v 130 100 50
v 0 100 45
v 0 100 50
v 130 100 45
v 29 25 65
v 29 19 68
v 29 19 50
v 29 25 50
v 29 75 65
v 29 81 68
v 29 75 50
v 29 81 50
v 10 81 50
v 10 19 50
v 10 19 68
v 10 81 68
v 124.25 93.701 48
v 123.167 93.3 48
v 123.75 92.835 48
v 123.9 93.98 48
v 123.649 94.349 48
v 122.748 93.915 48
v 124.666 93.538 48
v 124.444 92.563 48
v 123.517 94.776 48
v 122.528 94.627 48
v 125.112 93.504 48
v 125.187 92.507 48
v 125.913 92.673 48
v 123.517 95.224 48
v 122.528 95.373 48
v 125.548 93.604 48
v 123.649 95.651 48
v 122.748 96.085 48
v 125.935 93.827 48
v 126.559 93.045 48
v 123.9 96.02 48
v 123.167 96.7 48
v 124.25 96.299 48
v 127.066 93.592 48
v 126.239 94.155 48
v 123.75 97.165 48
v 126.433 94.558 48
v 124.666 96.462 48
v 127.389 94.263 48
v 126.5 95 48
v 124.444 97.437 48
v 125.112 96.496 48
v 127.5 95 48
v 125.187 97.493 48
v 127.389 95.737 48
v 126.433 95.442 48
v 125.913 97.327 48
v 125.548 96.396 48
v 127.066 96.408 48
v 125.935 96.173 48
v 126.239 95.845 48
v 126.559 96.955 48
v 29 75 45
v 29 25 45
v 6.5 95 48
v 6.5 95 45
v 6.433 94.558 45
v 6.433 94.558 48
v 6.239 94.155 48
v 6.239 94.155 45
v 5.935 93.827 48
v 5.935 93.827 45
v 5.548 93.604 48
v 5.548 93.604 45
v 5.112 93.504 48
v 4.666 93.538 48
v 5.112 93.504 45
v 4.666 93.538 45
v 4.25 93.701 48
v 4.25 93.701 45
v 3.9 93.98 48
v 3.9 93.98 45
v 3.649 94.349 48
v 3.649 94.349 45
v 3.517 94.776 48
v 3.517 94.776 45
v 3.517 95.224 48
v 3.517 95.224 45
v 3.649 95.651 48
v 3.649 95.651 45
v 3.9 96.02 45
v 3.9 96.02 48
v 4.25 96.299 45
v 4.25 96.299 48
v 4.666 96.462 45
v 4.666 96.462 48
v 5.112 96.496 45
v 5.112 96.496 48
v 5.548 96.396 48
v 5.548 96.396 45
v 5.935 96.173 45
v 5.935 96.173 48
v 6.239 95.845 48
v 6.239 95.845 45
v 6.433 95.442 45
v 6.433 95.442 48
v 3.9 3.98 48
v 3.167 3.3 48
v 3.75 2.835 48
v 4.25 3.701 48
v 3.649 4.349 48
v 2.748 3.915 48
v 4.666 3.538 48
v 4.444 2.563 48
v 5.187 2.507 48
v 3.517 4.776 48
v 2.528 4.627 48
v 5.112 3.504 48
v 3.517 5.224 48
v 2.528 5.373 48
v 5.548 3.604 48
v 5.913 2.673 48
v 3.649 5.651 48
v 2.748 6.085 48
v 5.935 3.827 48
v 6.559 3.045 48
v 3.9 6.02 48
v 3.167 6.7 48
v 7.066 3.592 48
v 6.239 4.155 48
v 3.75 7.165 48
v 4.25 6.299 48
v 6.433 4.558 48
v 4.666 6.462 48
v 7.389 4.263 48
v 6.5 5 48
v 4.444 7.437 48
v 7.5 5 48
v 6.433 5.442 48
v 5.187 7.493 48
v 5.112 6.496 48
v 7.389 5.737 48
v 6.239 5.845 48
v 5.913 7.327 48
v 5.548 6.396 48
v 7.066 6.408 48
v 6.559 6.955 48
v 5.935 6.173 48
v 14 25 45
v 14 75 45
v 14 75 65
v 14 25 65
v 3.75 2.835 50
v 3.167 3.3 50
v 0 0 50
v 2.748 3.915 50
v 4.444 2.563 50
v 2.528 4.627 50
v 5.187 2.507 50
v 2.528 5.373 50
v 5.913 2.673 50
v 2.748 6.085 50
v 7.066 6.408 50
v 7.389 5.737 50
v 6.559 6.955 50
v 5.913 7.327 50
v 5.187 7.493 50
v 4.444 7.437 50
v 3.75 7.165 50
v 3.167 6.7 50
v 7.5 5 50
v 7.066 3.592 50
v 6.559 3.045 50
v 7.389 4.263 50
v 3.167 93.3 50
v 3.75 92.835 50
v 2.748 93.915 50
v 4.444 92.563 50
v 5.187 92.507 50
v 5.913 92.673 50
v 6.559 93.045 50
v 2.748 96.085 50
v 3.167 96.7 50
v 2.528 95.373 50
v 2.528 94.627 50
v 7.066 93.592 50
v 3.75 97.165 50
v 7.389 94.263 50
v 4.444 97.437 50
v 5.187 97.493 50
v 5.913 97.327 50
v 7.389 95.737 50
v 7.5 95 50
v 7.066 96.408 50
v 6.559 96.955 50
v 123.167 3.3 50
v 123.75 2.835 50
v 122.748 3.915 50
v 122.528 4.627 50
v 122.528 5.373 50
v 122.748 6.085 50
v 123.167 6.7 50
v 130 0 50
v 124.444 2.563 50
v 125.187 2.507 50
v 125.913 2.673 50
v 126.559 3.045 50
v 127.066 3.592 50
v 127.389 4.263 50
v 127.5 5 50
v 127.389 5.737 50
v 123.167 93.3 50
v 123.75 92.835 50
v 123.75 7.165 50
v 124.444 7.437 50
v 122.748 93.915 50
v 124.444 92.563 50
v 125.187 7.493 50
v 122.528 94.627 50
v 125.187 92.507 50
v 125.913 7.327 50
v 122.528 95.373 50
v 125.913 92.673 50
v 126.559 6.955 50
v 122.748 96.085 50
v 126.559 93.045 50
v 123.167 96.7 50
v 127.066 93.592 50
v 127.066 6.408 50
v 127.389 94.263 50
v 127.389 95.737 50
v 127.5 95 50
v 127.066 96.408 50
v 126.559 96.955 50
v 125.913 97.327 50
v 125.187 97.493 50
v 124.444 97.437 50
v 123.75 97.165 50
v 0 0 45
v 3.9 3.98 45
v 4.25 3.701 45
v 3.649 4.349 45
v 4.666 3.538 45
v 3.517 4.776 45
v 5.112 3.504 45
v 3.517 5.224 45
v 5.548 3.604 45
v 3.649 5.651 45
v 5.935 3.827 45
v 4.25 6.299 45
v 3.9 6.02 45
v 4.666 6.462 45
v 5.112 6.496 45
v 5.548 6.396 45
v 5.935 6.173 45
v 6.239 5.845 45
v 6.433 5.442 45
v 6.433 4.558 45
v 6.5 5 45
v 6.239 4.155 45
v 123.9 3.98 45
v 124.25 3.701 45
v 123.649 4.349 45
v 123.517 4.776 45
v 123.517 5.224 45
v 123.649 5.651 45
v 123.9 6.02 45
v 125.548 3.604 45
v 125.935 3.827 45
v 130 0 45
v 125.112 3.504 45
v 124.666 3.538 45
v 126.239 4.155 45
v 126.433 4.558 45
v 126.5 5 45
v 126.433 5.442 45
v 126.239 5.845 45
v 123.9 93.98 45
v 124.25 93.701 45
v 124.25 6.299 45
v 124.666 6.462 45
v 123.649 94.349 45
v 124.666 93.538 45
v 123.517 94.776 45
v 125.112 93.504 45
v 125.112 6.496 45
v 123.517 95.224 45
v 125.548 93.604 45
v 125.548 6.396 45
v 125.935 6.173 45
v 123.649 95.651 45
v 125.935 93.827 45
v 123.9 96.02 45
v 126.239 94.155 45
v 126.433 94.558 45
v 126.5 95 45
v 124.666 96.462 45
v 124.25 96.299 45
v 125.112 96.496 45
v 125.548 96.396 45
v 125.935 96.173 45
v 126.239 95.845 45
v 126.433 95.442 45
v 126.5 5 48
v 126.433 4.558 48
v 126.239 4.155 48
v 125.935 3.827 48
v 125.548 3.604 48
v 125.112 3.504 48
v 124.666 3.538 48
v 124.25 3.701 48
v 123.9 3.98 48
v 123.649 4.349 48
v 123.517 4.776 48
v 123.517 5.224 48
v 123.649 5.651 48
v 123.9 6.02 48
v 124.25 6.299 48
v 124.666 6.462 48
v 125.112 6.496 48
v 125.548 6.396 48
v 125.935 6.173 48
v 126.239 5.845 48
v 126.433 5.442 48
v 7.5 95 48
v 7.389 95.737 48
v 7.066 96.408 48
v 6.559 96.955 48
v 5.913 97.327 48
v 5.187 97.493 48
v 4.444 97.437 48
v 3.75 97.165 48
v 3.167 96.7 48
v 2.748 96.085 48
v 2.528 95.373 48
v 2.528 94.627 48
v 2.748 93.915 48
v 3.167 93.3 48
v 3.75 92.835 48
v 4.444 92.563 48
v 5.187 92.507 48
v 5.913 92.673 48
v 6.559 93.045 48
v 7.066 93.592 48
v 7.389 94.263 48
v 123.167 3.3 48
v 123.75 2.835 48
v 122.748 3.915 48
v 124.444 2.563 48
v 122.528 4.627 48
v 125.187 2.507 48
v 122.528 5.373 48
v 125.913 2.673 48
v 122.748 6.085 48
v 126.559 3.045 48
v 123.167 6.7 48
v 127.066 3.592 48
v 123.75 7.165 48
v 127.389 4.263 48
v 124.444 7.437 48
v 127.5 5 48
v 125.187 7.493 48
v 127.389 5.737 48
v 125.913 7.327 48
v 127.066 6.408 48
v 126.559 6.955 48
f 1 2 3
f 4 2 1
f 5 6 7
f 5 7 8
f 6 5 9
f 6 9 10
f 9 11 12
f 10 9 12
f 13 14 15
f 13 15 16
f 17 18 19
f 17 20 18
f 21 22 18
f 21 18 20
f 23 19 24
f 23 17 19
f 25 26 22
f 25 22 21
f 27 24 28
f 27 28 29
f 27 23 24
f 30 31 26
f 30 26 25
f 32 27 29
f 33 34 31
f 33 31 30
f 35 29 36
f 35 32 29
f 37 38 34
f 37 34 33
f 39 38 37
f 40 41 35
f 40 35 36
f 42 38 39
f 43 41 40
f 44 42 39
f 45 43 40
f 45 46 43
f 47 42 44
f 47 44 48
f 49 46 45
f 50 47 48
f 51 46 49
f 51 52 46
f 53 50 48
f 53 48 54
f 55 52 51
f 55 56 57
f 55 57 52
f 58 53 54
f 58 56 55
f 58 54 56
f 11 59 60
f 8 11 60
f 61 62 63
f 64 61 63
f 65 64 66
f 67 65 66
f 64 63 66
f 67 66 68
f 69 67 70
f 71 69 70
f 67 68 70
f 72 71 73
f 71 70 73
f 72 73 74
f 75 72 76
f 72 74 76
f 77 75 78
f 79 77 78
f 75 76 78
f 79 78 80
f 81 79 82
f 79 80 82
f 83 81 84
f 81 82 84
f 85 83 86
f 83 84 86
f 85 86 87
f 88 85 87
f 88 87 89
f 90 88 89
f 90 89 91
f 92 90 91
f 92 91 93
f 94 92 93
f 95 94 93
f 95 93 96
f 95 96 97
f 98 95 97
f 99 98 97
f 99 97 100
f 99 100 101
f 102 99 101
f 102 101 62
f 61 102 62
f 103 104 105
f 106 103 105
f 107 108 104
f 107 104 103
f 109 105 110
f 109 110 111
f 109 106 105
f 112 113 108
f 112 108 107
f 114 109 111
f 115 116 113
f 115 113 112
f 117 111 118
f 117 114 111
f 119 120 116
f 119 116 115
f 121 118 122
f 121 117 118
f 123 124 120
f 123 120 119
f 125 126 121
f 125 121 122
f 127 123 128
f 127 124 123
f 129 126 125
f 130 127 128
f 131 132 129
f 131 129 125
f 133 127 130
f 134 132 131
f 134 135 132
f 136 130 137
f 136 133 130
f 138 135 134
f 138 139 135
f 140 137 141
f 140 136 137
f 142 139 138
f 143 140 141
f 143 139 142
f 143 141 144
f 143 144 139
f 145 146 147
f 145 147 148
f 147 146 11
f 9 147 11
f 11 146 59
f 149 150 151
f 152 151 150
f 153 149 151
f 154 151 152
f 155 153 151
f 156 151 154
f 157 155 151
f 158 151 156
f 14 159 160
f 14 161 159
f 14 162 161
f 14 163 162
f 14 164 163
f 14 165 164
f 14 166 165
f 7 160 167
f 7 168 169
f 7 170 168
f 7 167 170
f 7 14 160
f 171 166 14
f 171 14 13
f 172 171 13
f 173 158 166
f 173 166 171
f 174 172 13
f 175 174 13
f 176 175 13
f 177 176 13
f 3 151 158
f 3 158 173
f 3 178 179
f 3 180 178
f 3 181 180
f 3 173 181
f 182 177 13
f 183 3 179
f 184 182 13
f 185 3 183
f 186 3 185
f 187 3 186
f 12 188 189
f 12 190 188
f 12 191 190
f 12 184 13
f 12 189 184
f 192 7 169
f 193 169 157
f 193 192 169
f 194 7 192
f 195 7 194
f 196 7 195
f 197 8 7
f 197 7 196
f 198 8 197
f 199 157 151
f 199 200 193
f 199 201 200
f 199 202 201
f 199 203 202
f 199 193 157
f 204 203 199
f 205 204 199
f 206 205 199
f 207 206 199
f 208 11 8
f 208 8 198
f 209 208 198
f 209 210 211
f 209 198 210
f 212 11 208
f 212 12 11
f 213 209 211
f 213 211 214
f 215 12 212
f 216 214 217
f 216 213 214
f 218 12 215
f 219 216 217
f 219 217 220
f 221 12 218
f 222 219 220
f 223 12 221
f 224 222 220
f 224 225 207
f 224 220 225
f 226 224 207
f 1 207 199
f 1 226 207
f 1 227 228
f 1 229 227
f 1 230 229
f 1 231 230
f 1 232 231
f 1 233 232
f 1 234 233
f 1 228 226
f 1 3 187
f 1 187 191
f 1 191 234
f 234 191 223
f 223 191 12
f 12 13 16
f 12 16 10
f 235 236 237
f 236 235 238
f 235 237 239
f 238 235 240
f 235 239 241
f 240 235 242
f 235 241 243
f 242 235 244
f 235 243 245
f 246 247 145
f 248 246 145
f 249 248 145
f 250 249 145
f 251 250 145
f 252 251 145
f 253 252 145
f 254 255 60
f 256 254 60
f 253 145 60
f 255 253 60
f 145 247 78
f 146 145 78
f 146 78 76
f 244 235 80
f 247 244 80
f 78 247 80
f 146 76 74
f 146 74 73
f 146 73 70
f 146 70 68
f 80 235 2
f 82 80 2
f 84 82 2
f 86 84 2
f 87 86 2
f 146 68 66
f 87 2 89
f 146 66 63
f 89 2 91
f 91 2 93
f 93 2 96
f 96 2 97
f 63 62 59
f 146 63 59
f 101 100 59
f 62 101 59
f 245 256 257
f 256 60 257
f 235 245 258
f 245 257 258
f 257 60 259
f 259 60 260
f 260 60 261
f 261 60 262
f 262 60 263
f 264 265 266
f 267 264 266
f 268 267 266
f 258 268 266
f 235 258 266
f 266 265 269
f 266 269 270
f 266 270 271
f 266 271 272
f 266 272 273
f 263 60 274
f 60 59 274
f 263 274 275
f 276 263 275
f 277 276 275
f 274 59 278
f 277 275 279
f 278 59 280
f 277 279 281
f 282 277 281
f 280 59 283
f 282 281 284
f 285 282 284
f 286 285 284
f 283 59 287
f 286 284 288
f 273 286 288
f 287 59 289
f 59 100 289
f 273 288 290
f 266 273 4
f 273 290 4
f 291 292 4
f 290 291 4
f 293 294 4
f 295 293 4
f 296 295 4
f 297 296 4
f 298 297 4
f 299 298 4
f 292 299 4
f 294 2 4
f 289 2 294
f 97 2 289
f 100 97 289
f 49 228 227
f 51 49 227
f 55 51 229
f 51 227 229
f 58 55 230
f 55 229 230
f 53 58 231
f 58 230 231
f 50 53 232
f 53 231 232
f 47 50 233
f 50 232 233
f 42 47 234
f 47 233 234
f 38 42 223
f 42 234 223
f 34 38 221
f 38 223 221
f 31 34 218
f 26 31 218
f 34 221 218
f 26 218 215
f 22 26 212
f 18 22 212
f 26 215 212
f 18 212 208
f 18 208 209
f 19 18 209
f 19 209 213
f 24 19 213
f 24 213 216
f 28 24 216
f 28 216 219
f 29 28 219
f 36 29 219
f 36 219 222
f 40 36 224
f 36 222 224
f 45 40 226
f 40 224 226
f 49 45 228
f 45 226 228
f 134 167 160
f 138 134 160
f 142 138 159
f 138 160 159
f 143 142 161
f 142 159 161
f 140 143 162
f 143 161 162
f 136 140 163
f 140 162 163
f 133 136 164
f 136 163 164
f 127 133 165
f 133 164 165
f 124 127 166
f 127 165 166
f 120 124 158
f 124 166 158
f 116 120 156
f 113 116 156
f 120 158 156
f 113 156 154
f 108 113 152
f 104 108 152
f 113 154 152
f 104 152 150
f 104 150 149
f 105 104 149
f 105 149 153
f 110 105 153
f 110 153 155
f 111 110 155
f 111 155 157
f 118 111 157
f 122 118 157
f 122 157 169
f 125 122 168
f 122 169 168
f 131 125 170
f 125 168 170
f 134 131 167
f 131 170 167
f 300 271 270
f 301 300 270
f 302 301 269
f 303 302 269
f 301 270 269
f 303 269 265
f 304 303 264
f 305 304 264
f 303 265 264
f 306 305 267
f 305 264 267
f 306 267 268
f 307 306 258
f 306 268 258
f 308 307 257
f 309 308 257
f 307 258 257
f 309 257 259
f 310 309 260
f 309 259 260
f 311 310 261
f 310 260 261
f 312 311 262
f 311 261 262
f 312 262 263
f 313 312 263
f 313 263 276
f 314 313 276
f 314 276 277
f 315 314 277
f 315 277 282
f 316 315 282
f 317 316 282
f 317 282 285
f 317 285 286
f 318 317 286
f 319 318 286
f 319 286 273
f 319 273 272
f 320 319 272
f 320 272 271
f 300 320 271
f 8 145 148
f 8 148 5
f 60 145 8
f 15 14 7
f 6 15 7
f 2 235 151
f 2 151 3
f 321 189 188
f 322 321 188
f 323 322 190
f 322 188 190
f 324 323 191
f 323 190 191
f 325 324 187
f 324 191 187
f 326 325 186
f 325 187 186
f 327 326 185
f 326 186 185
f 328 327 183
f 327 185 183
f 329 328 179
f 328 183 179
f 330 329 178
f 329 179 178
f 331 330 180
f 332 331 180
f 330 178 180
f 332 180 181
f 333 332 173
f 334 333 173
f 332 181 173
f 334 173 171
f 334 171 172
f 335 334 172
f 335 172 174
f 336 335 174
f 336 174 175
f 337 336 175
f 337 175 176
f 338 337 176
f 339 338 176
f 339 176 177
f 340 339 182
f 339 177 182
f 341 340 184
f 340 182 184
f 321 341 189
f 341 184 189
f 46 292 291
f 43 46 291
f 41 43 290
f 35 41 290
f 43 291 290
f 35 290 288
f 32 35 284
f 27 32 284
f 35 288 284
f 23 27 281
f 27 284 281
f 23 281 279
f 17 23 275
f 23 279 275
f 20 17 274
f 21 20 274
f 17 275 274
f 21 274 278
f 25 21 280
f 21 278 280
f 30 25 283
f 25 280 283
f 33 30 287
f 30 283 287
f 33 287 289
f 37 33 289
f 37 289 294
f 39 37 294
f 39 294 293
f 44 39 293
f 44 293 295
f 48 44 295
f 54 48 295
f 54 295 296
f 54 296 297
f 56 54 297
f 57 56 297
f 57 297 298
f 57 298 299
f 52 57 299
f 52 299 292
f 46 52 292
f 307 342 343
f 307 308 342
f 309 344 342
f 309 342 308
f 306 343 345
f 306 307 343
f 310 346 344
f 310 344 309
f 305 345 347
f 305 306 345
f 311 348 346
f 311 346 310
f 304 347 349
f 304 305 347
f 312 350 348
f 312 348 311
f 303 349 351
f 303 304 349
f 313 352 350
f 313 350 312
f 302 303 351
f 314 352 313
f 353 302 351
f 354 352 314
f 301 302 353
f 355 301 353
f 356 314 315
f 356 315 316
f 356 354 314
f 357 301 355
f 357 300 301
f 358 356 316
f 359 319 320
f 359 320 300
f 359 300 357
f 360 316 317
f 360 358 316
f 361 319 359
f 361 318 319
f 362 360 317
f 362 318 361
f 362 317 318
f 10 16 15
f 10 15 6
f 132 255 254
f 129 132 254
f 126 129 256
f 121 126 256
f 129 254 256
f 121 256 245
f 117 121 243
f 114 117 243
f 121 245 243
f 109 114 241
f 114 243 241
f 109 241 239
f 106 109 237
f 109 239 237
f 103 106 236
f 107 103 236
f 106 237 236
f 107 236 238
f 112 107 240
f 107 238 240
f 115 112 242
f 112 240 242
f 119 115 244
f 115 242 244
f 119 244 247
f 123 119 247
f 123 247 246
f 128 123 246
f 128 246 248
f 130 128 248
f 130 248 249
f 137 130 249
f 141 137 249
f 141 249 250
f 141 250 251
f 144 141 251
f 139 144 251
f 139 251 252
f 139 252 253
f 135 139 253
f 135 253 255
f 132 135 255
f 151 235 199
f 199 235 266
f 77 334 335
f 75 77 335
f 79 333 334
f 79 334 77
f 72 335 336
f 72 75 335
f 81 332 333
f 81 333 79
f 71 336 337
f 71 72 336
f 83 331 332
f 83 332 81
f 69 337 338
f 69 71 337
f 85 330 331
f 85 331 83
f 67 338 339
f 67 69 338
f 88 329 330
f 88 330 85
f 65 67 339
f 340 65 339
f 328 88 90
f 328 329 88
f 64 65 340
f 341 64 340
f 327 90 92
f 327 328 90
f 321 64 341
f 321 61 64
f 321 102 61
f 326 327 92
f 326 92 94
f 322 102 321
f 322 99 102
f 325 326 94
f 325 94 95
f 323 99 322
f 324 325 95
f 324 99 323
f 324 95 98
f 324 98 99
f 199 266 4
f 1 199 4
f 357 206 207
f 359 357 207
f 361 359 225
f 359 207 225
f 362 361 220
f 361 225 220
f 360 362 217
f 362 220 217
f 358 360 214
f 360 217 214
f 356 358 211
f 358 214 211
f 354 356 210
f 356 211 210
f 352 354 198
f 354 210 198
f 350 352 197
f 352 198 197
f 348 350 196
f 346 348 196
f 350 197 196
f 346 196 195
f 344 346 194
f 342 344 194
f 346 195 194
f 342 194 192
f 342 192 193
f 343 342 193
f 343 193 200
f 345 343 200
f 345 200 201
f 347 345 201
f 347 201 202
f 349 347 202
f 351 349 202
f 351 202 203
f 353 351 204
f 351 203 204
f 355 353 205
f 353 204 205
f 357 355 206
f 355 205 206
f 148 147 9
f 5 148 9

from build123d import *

# Parameters (mm, degrees)
SKETCH082_W     = 130
SKETCH082_H     = 100
PAD013_DEPTH    = 5
SKETCH083_W     = 19
SKETCH083_H     = 62
PAD014_DEPTH    = 18
SKETCH084_W     = 15
SKETCH084_H     = 50
POCKET068_DEPTH = 20
SKETCH085_R     = 1.5
POCKET069_DEPTH = 5
SKETCH086_R     = 2.5
POCKET070_DEPTH = 2


with BuildPart() as part:
    # Sketch082 → Pad013 (new body)
    with BuildSketch(Plane.XY):
        with Locations((65, 50)):
            Rectangle(SKETCH082_W, SKETCH082_H)
    extrude(amount=PAD013_DEPTH)

    # Sketch083 (on Face6 of Pad013) → Pad014 (join)
    with BuildSketch(Plane.XY.offset(5)):
        with Locations((19.5, 50)):
            Rectangle(SKETCH083_W, SKETCH083_H)
    extrude(amount=PAD014_DEPTH)

    # Sketch084 (on Face4 of Pad014) → Pocket068 (cut)
    with BuildSketch(Plane(origin=(0, 0, 0), x_dir=(1, 0, 0), z_dir=(0, 0, -1))):
        with Locations((21.5, -50)):
            Rectangle(SKETCH084_W, SKETCH084_H)
    extrude(amount=-POCKET068_DEPTH, mode=Mode.SUBTRACT)

    # Sketch085 (on Face4 of Pocket068) → Pocket069 (cut)
    with BuildSketch(Plane(origin=(0, 0, 0), x_dir=(1, 0, 0), z_dir=(0, 0, -1))):
        with Locations((5, -5)):
            Circle(SKETCH085_R)
        with Locations((125, -5)):
            Circle(SKETCH085_R)
        with Locations((5, -95)):
            Circle(SKETCH085_R)
        with Locations((125, -95)):
            Circle(SKETCH085_R)
    extrude(amount=-POCKET069_DEPTH, mode=Mode.SUBTRACT)

    # Sketch086 (on Face5 of Pocket069) → Pocket070 (cut)
    with BuildSketch(Plane.XY.offset(5)):
        with Locations((5, 95)):
            Circle(SKETCH086_R)
        with Locations((5, 5)):
            Circle(SKETCH086_R)
        with Locations((125, 5)):
            Circle(SKETCH086_R)
        with Locations((125, 95)):
            Circle(SKETCH086_R)
    extrude(amount=-POCKET070_DEPTH, mode=Mode.SUBTRACT)


with BuildPart() as part_1:
    # Body013 placement: moved
    add(part.part.moved(Location((0, 0, 45))))


solid = part_1.part
